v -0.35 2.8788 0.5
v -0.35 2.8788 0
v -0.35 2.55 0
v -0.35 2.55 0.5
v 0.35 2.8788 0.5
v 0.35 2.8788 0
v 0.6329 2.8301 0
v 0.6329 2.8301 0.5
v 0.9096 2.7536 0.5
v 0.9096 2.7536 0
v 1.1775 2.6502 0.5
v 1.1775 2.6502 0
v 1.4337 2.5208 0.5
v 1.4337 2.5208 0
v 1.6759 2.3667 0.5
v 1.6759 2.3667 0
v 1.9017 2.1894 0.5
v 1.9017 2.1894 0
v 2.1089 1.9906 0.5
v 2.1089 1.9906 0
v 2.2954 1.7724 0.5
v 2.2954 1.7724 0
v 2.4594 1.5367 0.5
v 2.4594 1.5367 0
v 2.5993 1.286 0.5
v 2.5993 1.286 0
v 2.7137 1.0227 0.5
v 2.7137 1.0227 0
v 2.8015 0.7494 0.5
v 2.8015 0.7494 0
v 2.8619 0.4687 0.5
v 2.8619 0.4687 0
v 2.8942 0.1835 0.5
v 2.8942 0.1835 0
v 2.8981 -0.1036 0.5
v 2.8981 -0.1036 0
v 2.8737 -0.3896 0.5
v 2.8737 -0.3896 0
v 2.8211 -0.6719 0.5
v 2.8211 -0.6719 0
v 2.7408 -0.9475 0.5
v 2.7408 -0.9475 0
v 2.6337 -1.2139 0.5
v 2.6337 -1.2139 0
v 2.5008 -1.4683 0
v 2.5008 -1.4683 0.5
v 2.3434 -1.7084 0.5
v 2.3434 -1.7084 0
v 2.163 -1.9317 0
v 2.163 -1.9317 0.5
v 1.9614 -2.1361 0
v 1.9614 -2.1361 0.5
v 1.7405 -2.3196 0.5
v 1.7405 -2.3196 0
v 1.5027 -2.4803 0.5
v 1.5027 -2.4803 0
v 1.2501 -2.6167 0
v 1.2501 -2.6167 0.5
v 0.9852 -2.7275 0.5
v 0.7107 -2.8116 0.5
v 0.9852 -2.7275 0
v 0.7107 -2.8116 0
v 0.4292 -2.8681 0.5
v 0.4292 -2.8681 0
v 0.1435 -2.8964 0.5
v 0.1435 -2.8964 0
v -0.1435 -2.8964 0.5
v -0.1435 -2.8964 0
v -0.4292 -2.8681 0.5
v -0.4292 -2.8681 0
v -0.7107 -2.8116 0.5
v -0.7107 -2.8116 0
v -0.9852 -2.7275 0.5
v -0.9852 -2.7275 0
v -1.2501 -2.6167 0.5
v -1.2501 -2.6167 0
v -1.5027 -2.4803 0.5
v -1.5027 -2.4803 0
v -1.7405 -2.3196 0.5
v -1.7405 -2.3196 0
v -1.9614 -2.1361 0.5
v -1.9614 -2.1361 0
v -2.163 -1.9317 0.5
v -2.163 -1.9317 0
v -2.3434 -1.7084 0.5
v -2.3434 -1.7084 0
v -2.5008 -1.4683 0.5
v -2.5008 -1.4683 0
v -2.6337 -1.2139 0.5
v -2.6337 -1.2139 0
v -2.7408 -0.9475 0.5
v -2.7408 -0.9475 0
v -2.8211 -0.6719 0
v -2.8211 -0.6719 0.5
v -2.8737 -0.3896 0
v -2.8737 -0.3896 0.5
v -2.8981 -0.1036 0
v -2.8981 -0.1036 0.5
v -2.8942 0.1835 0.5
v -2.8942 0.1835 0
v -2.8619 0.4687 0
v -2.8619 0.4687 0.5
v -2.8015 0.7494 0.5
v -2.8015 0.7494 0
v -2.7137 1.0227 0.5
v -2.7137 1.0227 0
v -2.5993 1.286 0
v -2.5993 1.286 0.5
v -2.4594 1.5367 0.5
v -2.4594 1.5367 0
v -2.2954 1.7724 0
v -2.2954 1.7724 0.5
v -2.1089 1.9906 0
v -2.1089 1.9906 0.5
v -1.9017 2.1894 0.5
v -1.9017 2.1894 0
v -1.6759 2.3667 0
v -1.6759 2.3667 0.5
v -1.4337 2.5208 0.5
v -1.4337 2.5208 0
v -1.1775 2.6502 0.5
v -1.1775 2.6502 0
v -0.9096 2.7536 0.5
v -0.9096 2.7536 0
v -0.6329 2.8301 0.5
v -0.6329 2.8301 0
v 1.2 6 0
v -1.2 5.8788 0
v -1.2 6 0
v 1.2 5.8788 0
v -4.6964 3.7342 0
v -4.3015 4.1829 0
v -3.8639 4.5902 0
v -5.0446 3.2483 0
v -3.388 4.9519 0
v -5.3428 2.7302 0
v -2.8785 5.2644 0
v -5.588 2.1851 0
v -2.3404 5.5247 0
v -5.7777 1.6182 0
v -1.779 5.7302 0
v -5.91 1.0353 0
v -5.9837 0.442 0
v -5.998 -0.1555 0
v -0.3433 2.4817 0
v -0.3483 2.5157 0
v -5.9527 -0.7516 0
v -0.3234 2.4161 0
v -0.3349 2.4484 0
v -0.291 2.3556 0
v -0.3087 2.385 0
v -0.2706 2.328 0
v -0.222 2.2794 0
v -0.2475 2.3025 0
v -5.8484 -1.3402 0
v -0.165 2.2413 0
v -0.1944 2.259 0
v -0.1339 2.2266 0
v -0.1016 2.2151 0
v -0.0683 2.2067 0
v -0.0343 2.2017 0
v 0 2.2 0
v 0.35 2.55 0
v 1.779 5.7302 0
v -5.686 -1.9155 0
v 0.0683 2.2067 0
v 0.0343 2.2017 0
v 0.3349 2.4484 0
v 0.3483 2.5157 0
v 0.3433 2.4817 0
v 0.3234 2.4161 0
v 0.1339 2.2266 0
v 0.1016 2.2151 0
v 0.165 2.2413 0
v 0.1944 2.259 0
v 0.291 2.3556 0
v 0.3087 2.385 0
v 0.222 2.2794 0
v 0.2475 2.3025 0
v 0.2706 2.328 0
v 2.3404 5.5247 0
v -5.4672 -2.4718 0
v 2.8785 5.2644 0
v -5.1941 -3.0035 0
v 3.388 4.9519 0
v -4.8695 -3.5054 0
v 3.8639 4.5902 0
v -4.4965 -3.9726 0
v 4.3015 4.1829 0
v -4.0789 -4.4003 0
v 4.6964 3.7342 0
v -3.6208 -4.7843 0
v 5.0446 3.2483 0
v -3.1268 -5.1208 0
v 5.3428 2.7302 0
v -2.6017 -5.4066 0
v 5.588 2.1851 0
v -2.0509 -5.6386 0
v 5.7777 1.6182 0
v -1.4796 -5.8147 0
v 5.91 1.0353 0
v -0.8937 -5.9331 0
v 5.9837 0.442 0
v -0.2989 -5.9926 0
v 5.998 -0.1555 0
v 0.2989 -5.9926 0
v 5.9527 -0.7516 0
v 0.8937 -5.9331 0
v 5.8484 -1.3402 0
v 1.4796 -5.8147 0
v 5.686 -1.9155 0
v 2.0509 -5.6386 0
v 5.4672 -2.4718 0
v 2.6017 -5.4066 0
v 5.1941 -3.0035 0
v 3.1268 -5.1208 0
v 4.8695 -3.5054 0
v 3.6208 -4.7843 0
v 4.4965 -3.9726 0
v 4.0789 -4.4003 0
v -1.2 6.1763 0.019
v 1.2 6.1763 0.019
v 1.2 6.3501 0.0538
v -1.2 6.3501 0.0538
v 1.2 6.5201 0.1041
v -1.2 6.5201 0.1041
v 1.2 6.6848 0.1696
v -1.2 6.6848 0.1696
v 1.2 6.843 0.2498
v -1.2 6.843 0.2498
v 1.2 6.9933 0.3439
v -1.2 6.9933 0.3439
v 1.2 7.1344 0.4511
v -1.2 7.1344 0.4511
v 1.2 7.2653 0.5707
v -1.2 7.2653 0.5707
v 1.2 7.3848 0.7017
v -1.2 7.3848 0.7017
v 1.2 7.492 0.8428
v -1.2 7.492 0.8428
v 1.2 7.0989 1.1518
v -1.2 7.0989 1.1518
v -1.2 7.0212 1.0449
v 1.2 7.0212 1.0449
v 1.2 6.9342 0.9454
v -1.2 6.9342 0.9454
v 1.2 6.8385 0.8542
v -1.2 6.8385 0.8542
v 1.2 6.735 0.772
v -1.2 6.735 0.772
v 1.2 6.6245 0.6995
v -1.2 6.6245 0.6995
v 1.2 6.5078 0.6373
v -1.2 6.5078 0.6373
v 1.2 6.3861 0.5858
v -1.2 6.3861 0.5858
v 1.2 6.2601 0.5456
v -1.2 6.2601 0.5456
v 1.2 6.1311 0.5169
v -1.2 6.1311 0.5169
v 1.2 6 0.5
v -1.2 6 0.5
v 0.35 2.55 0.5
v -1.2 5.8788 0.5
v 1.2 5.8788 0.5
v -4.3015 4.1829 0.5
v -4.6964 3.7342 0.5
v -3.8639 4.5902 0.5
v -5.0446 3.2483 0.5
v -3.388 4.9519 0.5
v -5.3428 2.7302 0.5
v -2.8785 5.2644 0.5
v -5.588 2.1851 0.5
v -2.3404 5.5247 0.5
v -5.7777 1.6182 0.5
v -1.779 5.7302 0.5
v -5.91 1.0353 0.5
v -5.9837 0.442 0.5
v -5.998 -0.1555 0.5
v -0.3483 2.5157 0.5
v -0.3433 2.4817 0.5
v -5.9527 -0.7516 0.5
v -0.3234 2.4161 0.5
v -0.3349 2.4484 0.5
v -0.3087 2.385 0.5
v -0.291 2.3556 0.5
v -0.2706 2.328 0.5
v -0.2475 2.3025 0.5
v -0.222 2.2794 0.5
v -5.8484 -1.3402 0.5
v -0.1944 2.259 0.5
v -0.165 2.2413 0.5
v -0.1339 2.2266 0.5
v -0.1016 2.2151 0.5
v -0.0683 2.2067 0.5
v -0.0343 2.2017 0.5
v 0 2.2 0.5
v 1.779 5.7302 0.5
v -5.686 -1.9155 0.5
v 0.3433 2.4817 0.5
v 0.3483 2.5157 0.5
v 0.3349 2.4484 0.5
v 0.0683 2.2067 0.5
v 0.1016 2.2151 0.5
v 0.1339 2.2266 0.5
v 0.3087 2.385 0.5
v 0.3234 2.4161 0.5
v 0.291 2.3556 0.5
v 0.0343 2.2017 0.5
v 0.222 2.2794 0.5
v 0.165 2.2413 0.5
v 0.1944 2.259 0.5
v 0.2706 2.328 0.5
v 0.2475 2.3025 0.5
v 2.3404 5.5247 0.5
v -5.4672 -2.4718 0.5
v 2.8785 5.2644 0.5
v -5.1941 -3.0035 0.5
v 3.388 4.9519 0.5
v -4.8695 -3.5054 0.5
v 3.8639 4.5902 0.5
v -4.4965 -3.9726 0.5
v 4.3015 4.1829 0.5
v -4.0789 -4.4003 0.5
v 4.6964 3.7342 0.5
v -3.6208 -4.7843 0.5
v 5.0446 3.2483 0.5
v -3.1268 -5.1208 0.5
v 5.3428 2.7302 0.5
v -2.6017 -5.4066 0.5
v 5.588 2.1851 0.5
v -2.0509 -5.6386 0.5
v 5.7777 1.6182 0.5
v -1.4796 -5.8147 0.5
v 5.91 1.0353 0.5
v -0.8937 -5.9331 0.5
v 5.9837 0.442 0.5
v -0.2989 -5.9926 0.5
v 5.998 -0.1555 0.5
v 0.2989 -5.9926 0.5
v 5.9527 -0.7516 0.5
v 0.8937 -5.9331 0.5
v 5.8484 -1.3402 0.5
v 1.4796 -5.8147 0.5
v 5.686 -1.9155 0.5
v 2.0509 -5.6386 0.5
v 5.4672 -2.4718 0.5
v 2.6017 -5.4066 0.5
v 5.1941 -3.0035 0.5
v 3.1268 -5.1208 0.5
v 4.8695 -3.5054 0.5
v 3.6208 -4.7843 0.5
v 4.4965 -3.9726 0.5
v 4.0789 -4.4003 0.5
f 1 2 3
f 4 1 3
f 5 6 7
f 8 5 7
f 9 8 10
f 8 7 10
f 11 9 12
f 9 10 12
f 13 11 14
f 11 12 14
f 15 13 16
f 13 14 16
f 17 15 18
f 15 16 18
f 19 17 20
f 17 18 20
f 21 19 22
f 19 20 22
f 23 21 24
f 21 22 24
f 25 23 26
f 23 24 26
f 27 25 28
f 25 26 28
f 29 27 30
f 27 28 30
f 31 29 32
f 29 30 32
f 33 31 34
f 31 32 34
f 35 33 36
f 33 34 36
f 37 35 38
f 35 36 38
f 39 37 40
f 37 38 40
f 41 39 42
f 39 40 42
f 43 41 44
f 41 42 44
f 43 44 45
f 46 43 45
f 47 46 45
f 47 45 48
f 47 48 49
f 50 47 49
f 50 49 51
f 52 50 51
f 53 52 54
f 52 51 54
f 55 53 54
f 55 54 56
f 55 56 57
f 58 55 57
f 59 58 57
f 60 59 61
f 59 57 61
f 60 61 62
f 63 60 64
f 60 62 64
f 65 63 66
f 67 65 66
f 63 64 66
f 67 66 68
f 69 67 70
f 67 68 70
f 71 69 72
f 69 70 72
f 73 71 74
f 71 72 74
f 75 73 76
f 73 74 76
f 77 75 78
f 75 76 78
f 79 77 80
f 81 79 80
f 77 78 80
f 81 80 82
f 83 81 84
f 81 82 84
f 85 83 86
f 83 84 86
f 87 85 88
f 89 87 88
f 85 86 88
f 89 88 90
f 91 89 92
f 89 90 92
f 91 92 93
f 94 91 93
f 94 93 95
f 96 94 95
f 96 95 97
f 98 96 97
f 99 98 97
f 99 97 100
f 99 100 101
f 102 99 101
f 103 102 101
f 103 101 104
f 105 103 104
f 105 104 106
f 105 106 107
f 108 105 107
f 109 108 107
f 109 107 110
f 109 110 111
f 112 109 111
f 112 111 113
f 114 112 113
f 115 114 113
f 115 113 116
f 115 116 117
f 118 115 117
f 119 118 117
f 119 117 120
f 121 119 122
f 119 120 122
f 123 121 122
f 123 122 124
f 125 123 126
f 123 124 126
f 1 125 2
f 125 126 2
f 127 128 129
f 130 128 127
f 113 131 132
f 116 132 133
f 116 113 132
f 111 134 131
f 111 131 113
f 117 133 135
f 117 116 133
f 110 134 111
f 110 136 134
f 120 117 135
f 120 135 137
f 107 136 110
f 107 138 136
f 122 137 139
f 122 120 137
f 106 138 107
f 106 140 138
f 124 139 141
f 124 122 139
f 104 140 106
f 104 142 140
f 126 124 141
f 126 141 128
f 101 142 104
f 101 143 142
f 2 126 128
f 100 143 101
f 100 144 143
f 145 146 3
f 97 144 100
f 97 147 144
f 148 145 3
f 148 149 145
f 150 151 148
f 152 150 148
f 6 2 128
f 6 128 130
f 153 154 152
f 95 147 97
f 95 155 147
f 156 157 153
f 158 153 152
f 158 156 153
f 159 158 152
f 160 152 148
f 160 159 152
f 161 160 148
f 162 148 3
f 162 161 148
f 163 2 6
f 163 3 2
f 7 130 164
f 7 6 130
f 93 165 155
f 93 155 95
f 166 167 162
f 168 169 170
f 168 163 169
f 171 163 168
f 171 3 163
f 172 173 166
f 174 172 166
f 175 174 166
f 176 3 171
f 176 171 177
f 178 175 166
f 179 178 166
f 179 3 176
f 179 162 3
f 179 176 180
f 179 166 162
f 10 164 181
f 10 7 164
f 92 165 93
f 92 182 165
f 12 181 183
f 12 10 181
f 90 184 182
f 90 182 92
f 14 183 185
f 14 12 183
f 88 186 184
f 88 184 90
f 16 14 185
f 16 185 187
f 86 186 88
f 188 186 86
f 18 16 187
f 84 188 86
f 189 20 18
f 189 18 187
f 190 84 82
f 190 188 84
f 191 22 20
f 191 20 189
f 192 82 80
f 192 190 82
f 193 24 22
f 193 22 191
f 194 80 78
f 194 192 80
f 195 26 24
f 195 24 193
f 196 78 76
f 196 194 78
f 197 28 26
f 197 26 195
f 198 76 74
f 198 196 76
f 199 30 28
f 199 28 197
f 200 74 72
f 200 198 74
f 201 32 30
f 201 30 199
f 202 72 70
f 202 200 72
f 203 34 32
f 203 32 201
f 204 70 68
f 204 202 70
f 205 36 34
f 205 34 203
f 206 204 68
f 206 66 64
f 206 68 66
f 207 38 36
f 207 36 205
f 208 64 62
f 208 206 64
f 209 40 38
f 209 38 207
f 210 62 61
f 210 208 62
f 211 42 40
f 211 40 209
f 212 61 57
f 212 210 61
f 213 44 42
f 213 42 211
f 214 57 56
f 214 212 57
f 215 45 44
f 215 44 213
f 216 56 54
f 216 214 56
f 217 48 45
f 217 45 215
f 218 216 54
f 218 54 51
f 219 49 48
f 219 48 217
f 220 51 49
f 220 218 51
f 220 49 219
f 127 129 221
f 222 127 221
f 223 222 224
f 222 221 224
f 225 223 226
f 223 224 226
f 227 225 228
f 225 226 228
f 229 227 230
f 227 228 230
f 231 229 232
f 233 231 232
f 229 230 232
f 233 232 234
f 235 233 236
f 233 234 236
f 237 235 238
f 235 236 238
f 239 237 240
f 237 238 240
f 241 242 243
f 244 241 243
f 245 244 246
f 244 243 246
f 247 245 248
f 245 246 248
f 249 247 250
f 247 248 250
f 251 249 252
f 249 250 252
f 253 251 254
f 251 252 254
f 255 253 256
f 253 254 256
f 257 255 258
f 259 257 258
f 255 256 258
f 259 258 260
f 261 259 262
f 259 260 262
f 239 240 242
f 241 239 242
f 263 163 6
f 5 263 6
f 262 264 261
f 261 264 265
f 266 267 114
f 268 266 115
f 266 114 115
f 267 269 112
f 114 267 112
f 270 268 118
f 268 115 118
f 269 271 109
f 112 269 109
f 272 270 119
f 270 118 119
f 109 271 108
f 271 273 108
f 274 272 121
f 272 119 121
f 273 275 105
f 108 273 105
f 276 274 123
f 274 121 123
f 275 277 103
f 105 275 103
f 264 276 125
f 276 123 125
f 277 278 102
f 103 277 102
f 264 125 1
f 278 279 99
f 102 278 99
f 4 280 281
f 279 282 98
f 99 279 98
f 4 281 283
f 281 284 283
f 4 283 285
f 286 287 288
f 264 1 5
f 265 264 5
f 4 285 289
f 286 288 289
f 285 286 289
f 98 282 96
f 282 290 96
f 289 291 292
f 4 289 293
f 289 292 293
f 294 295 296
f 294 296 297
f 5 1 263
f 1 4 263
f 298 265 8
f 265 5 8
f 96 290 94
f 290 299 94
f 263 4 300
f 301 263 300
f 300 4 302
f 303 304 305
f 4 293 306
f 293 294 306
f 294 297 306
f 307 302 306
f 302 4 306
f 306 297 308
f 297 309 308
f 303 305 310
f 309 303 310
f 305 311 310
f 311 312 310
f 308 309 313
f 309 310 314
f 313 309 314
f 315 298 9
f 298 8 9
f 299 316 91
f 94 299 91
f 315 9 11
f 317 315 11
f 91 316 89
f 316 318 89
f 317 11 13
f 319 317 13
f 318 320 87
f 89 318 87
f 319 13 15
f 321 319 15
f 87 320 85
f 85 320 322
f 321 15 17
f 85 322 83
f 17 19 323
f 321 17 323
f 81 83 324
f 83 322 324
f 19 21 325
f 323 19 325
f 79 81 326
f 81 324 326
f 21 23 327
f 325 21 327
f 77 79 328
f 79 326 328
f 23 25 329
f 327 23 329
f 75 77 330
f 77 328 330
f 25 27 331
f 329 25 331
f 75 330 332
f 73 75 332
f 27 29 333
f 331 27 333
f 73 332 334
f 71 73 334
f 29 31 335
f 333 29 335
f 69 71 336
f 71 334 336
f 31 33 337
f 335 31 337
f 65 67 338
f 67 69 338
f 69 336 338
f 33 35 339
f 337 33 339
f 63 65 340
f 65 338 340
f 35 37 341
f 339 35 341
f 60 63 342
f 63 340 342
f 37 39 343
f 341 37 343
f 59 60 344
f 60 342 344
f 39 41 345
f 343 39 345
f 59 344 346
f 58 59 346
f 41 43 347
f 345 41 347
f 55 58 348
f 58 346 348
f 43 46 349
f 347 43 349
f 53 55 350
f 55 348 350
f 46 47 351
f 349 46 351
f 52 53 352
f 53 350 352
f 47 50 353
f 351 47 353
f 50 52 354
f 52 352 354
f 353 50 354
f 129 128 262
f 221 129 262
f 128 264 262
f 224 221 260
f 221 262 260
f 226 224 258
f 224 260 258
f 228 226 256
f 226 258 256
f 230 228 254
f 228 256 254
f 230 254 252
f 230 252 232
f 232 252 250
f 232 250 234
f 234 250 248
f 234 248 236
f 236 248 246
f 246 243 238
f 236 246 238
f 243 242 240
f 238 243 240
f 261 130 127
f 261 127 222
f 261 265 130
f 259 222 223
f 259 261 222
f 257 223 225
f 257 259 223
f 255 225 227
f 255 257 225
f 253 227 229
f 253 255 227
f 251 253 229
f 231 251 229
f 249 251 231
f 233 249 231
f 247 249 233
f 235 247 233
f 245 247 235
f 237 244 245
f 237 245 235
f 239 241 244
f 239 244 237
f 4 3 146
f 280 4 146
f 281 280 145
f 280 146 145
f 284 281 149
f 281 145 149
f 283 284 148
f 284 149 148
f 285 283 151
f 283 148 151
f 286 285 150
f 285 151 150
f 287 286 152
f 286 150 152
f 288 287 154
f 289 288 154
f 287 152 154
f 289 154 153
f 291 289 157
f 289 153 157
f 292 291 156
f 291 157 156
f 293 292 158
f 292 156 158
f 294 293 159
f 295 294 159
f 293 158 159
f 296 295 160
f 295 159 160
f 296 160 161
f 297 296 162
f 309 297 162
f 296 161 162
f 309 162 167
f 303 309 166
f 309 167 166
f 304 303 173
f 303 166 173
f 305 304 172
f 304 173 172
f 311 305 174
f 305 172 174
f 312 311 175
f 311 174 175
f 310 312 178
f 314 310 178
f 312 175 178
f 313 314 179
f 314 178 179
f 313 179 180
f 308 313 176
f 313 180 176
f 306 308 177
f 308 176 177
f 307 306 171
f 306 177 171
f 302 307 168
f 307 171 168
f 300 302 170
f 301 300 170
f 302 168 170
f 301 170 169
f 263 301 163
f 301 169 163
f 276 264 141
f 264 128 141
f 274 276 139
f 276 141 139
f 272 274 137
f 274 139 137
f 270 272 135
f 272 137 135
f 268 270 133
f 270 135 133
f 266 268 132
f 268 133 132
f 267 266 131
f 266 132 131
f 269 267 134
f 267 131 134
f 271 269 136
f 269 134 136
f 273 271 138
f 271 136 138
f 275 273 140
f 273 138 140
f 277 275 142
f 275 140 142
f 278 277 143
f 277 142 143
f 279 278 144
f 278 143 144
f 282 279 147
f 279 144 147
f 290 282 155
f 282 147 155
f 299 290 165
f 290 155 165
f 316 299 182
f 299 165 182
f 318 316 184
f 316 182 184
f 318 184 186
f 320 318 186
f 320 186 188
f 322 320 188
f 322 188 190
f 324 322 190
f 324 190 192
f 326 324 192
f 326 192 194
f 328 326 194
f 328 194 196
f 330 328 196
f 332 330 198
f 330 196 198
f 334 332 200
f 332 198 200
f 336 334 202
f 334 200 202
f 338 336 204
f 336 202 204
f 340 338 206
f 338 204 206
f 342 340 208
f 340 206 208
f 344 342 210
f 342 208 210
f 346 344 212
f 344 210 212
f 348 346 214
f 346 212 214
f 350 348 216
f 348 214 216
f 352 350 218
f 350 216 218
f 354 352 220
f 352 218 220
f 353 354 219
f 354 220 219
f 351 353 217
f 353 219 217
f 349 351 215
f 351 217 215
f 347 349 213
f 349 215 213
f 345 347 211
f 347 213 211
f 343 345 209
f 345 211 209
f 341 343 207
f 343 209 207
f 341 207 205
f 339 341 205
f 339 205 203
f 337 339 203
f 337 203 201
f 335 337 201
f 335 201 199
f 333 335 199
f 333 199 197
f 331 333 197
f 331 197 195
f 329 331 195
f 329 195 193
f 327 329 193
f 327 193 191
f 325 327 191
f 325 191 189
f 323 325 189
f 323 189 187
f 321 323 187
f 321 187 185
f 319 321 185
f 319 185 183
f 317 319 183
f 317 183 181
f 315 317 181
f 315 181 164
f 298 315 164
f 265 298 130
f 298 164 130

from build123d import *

# Parameters (mm, degrees)
SKETCH1_R           = 6
BOSS_EXTRUDE1_DEPTH = 0.5
BOSS_EXTRUDE2_START = -0.121225
SKETCH2_W           = 2.4
SKETCH2_H           = 0.5
BOSS_EXTRUDE2_DEPTH = 0.121225
SWEEP1_START        = -1.2
SWEEP1_DEPTH        = 2.4


# Read off the part's stored shape, not the designer's step: Sweep1
with BuildPart() as part:
    # Sketch1 → Boss-Extrude1 (new body)
    with BuildSketch(Plane.XY):
        Circle(SKETCH1_R)
        with BuildLine():
            Line((-0.35, 2.878801834), (-0.35, 2.55))
            ThreePointArc((-0.35, 2.55), (0, 2.2), (0.35, 2.55))
            Line((0.35, 2.55), (0.35, 2.878801834))
            ThreePointArc((0.35, 2.878801834), (0, -2.9), (-0.35, 2.878801834))
        make_face(mode=Mode.SUBTRACT)
    extrude(amount=BOSS_EXTRUDE1_DEPTH)

    # Sketch2 → Boss-Extrude2 (add)
    with BuildSketch(Plane(origin=(0, 6, 0), x_dir=(1, 0, 0), z_dir=(0, 1, 0)).offset(BOSS_EXTRUDE2_START)):
        with Locations((0, -0.25)):
            Rectangle(SKETCH2_W, SKETCH2_H)
    extrude(amount=BOSS_EXTRUDE2_DEPTH)

    # Sweep1 outline → Sweep1 (add)
    with BuildSketch(Plane.YZ.offset(SWEEP1_START)):
        with BuildLine():
            ThreePointArc((6, 0), (6.842994327, 0.249762545), (7.492047788, 0.84284801))
            Line((7.492047788, 0.84284801), (7.098940121, 1.151824324))
            ThreePointArc((7.098940121, 1.151824324), (6.624463044, 0.699478098), (6, 0.5))
            Line((6, 0.5), (6, 0))
        make_face()
    extrude(amount=SWEEP1_DEPTH)


solid = part.part
